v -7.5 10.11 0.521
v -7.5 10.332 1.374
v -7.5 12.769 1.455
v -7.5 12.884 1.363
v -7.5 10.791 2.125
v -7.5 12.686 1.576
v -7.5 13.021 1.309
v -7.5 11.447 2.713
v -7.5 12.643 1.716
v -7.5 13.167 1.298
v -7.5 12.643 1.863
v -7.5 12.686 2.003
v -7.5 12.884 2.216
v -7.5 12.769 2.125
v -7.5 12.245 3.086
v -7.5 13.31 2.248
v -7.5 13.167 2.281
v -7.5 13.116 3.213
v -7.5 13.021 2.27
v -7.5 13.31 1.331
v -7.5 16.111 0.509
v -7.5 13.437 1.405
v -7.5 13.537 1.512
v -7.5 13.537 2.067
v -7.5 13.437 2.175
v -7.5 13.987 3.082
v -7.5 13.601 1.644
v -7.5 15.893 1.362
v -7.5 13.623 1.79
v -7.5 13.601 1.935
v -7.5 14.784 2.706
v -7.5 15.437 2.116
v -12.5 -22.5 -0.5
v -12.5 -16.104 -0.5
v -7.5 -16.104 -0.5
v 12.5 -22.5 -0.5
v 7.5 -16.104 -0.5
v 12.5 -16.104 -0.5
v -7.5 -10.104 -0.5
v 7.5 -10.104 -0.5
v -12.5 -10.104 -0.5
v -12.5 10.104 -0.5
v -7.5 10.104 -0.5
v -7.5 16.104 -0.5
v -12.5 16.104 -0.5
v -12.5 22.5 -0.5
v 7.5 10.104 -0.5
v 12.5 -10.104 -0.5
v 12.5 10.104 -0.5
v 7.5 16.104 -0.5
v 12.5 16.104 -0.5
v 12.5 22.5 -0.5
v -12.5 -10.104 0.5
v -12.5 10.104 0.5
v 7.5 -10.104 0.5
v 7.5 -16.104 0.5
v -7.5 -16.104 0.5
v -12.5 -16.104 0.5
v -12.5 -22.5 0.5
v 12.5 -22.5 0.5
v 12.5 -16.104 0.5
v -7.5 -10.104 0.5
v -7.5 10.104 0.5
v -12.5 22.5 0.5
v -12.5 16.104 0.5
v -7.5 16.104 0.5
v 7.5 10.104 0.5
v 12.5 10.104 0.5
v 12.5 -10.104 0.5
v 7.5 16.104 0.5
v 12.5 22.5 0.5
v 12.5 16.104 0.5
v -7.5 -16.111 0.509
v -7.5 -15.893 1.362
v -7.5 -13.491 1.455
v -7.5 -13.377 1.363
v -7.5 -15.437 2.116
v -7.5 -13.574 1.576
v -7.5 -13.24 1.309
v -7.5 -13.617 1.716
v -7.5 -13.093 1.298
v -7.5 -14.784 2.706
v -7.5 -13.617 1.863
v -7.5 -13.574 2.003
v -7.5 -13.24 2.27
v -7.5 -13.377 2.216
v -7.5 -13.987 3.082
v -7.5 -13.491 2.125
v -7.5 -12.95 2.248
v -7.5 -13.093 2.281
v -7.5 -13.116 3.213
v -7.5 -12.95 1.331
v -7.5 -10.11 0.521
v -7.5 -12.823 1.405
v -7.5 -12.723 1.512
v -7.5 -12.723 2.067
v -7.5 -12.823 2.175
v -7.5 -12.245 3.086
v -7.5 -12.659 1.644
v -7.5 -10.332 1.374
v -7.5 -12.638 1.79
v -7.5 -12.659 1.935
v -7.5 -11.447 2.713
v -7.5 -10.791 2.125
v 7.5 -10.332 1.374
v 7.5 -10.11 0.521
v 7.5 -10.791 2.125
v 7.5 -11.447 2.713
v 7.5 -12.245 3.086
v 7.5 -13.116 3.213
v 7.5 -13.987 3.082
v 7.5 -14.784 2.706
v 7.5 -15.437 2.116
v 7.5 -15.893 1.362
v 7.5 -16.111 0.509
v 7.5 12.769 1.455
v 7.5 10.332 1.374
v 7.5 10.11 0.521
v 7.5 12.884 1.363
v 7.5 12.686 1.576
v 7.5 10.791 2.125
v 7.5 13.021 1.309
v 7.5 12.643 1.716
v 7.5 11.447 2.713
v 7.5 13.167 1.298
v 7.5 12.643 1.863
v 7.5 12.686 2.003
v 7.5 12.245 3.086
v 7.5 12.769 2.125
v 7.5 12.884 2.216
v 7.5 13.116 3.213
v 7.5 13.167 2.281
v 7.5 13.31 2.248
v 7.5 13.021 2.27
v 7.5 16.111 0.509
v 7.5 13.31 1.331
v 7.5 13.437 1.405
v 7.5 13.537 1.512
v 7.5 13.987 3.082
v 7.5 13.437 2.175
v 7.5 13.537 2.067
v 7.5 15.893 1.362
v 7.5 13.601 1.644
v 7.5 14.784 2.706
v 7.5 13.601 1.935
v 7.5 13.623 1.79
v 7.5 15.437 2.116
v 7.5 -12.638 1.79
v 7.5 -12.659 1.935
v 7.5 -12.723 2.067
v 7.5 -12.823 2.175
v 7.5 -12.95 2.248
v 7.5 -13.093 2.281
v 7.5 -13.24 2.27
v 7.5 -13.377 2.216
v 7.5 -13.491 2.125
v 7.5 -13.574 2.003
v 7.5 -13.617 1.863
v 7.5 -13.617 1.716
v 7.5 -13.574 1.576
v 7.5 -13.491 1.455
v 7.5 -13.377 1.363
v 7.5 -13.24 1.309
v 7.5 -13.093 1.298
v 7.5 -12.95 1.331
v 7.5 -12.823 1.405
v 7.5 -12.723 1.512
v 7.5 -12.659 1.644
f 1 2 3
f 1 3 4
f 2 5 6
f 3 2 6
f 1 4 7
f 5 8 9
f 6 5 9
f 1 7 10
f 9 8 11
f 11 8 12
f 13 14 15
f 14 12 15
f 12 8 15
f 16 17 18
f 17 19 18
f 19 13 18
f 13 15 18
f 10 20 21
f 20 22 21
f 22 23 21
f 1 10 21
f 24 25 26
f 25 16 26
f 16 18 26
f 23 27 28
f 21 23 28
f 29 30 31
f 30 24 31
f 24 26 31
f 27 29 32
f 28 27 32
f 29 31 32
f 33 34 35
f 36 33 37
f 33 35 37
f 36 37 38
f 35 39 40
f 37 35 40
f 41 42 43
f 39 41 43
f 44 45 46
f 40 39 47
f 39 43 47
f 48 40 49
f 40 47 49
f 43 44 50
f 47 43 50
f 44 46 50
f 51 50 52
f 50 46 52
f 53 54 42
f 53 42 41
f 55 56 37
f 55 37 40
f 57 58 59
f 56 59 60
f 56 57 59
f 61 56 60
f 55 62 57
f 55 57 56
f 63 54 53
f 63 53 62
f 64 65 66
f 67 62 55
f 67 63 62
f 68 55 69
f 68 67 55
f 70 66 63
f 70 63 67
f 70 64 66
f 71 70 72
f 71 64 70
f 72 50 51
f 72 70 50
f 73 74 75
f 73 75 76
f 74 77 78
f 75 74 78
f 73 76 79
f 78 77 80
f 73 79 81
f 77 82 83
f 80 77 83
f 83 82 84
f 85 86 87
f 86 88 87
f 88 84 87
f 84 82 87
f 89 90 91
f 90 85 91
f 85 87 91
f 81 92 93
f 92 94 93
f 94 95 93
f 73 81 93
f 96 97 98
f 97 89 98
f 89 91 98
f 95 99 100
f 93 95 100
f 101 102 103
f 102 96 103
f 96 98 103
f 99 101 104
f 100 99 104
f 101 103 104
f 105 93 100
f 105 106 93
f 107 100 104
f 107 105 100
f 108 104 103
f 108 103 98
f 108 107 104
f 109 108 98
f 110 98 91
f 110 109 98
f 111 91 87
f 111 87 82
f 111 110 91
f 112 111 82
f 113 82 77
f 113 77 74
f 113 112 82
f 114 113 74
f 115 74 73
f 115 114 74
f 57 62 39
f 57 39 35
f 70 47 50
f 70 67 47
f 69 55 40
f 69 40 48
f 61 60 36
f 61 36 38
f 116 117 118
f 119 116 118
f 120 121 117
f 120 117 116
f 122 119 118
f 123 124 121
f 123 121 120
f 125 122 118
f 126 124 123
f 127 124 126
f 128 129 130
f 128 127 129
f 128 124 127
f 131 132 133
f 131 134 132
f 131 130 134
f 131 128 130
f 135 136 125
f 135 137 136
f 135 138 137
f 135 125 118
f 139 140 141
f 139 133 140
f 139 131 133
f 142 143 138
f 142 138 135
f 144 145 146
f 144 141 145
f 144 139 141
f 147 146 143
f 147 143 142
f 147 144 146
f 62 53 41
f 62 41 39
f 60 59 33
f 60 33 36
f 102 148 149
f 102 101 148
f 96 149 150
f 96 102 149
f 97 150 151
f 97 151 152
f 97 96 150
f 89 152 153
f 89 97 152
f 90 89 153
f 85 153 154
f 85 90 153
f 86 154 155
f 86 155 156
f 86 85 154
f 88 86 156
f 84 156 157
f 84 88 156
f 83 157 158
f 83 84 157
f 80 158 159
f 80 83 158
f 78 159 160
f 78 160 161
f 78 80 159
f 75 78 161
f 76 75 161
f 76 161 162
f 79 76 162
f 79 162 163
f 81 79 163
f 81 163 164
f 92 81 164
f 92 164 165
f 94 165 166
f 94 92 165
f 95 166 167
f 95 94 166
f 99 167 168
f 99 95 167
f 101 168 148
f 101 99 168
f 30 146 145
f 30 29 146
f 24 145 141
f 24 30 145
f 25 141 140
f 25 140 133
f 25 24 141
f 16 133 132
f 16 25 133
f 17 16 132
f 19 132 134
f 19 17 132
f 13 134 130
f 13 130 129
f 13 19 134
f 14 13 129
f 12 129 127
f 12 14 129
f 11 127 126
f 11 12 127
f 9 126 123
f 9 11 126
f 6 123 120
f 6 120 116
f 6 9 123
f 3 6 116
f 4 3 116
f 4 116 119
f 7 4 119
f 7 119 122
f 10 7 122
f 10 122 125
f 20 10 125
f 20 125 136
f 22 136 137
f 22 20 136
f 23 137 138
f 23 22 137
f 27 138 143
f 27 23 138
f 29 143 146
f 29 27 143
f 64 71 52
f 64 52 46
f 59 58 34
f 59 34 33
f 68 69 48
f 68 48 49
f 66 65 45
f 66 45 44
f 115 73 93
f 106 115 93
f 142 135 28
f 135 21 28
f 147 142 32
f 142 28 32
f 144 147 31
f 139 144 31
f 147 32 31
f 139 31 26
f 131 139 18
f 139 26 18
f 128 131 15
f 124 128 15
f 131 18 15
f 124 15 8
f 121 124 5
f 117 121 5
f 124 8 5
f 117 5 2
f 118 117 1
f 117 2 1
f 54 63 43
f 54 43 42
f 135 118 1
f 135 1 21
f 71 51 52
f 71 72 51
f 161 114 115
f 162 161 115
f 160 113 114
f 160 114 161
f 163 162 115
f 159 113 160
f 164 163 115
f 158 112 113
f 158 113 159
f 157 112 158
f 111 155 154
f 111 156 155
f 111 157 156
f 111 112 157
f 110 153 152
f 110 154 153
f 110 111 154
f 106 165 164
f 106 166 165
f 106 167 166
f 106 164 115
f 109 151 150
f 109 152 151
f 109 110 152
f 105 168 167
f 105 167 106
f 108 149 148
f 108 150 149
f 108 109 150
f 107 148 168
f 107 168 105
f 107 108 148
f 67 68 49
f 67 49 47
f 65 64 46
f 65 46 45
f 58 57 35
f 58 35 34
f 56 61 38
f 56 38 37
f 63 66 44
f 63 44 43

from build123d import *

# Parameters (mm, degrees)
F1_DEPTH = 0.5
F2_R     = 0.492701
F3_DEPTH = 7.5


with BuildPart() as f1:
    # F0 (on Top) → F1 (new body, symmetric)
    with BuildSketch(Plane.XY):
        Polygon((12.5, 16.104376), (12.5, 22.5), (-12.5, 22.5), (-12.5, 16.104376), (-7.5, 16.104376), (-7.5, 10.104376), (-12.5, 10.104376), (-12.5, -10.104376), (-7.5, -10.104376), (-7.5, -16.104376), (-12.5, -16.104376), (-12.5, -22.5), (12.5, -22.5), (12.5, -16.104376), (7.5, -16.104376), (7.5, -10.104376), (12.5, -10.104376), (12.5, 10.104376), (7.5, 10.104376), (7.5, 16.104376), align=None)
    extrude(amount=F1_DEPTH, both=True)


with BuildPart() as f3:
    # F2 (on Right) → F3 (new body, symmetric)
    with BuildSketch(Plane.YZ):
        with BuildLine():
            Line((10.110452, 0.521282), (16.11126, 0.50916))
            ThreePointArc((16.11126, 0.50916), (13.116306, 3.212707), (10.110452, 0.521282))
        make_face()
        with Locations((13.130261, 1.789711)):
            Circle(F2_R, mode=Mode.SUBTRACT)
        with BuildLine():
            ThreePointArc((-10.110452, 0.521282), (-13.116306, 3.212707), (-16.11126, 0.50916))
            Line((-16.11126, 0.50916), (-10.110452, 0.521282))
        make_face()
        with Locations((-13.130261, 1.789711)):
            Circle(F2_R, mode=Mode.SUBTRACT)
    extrude(amount=F3_DEPTH, both=True)


solid = Compound([f1.part, f3.part])
